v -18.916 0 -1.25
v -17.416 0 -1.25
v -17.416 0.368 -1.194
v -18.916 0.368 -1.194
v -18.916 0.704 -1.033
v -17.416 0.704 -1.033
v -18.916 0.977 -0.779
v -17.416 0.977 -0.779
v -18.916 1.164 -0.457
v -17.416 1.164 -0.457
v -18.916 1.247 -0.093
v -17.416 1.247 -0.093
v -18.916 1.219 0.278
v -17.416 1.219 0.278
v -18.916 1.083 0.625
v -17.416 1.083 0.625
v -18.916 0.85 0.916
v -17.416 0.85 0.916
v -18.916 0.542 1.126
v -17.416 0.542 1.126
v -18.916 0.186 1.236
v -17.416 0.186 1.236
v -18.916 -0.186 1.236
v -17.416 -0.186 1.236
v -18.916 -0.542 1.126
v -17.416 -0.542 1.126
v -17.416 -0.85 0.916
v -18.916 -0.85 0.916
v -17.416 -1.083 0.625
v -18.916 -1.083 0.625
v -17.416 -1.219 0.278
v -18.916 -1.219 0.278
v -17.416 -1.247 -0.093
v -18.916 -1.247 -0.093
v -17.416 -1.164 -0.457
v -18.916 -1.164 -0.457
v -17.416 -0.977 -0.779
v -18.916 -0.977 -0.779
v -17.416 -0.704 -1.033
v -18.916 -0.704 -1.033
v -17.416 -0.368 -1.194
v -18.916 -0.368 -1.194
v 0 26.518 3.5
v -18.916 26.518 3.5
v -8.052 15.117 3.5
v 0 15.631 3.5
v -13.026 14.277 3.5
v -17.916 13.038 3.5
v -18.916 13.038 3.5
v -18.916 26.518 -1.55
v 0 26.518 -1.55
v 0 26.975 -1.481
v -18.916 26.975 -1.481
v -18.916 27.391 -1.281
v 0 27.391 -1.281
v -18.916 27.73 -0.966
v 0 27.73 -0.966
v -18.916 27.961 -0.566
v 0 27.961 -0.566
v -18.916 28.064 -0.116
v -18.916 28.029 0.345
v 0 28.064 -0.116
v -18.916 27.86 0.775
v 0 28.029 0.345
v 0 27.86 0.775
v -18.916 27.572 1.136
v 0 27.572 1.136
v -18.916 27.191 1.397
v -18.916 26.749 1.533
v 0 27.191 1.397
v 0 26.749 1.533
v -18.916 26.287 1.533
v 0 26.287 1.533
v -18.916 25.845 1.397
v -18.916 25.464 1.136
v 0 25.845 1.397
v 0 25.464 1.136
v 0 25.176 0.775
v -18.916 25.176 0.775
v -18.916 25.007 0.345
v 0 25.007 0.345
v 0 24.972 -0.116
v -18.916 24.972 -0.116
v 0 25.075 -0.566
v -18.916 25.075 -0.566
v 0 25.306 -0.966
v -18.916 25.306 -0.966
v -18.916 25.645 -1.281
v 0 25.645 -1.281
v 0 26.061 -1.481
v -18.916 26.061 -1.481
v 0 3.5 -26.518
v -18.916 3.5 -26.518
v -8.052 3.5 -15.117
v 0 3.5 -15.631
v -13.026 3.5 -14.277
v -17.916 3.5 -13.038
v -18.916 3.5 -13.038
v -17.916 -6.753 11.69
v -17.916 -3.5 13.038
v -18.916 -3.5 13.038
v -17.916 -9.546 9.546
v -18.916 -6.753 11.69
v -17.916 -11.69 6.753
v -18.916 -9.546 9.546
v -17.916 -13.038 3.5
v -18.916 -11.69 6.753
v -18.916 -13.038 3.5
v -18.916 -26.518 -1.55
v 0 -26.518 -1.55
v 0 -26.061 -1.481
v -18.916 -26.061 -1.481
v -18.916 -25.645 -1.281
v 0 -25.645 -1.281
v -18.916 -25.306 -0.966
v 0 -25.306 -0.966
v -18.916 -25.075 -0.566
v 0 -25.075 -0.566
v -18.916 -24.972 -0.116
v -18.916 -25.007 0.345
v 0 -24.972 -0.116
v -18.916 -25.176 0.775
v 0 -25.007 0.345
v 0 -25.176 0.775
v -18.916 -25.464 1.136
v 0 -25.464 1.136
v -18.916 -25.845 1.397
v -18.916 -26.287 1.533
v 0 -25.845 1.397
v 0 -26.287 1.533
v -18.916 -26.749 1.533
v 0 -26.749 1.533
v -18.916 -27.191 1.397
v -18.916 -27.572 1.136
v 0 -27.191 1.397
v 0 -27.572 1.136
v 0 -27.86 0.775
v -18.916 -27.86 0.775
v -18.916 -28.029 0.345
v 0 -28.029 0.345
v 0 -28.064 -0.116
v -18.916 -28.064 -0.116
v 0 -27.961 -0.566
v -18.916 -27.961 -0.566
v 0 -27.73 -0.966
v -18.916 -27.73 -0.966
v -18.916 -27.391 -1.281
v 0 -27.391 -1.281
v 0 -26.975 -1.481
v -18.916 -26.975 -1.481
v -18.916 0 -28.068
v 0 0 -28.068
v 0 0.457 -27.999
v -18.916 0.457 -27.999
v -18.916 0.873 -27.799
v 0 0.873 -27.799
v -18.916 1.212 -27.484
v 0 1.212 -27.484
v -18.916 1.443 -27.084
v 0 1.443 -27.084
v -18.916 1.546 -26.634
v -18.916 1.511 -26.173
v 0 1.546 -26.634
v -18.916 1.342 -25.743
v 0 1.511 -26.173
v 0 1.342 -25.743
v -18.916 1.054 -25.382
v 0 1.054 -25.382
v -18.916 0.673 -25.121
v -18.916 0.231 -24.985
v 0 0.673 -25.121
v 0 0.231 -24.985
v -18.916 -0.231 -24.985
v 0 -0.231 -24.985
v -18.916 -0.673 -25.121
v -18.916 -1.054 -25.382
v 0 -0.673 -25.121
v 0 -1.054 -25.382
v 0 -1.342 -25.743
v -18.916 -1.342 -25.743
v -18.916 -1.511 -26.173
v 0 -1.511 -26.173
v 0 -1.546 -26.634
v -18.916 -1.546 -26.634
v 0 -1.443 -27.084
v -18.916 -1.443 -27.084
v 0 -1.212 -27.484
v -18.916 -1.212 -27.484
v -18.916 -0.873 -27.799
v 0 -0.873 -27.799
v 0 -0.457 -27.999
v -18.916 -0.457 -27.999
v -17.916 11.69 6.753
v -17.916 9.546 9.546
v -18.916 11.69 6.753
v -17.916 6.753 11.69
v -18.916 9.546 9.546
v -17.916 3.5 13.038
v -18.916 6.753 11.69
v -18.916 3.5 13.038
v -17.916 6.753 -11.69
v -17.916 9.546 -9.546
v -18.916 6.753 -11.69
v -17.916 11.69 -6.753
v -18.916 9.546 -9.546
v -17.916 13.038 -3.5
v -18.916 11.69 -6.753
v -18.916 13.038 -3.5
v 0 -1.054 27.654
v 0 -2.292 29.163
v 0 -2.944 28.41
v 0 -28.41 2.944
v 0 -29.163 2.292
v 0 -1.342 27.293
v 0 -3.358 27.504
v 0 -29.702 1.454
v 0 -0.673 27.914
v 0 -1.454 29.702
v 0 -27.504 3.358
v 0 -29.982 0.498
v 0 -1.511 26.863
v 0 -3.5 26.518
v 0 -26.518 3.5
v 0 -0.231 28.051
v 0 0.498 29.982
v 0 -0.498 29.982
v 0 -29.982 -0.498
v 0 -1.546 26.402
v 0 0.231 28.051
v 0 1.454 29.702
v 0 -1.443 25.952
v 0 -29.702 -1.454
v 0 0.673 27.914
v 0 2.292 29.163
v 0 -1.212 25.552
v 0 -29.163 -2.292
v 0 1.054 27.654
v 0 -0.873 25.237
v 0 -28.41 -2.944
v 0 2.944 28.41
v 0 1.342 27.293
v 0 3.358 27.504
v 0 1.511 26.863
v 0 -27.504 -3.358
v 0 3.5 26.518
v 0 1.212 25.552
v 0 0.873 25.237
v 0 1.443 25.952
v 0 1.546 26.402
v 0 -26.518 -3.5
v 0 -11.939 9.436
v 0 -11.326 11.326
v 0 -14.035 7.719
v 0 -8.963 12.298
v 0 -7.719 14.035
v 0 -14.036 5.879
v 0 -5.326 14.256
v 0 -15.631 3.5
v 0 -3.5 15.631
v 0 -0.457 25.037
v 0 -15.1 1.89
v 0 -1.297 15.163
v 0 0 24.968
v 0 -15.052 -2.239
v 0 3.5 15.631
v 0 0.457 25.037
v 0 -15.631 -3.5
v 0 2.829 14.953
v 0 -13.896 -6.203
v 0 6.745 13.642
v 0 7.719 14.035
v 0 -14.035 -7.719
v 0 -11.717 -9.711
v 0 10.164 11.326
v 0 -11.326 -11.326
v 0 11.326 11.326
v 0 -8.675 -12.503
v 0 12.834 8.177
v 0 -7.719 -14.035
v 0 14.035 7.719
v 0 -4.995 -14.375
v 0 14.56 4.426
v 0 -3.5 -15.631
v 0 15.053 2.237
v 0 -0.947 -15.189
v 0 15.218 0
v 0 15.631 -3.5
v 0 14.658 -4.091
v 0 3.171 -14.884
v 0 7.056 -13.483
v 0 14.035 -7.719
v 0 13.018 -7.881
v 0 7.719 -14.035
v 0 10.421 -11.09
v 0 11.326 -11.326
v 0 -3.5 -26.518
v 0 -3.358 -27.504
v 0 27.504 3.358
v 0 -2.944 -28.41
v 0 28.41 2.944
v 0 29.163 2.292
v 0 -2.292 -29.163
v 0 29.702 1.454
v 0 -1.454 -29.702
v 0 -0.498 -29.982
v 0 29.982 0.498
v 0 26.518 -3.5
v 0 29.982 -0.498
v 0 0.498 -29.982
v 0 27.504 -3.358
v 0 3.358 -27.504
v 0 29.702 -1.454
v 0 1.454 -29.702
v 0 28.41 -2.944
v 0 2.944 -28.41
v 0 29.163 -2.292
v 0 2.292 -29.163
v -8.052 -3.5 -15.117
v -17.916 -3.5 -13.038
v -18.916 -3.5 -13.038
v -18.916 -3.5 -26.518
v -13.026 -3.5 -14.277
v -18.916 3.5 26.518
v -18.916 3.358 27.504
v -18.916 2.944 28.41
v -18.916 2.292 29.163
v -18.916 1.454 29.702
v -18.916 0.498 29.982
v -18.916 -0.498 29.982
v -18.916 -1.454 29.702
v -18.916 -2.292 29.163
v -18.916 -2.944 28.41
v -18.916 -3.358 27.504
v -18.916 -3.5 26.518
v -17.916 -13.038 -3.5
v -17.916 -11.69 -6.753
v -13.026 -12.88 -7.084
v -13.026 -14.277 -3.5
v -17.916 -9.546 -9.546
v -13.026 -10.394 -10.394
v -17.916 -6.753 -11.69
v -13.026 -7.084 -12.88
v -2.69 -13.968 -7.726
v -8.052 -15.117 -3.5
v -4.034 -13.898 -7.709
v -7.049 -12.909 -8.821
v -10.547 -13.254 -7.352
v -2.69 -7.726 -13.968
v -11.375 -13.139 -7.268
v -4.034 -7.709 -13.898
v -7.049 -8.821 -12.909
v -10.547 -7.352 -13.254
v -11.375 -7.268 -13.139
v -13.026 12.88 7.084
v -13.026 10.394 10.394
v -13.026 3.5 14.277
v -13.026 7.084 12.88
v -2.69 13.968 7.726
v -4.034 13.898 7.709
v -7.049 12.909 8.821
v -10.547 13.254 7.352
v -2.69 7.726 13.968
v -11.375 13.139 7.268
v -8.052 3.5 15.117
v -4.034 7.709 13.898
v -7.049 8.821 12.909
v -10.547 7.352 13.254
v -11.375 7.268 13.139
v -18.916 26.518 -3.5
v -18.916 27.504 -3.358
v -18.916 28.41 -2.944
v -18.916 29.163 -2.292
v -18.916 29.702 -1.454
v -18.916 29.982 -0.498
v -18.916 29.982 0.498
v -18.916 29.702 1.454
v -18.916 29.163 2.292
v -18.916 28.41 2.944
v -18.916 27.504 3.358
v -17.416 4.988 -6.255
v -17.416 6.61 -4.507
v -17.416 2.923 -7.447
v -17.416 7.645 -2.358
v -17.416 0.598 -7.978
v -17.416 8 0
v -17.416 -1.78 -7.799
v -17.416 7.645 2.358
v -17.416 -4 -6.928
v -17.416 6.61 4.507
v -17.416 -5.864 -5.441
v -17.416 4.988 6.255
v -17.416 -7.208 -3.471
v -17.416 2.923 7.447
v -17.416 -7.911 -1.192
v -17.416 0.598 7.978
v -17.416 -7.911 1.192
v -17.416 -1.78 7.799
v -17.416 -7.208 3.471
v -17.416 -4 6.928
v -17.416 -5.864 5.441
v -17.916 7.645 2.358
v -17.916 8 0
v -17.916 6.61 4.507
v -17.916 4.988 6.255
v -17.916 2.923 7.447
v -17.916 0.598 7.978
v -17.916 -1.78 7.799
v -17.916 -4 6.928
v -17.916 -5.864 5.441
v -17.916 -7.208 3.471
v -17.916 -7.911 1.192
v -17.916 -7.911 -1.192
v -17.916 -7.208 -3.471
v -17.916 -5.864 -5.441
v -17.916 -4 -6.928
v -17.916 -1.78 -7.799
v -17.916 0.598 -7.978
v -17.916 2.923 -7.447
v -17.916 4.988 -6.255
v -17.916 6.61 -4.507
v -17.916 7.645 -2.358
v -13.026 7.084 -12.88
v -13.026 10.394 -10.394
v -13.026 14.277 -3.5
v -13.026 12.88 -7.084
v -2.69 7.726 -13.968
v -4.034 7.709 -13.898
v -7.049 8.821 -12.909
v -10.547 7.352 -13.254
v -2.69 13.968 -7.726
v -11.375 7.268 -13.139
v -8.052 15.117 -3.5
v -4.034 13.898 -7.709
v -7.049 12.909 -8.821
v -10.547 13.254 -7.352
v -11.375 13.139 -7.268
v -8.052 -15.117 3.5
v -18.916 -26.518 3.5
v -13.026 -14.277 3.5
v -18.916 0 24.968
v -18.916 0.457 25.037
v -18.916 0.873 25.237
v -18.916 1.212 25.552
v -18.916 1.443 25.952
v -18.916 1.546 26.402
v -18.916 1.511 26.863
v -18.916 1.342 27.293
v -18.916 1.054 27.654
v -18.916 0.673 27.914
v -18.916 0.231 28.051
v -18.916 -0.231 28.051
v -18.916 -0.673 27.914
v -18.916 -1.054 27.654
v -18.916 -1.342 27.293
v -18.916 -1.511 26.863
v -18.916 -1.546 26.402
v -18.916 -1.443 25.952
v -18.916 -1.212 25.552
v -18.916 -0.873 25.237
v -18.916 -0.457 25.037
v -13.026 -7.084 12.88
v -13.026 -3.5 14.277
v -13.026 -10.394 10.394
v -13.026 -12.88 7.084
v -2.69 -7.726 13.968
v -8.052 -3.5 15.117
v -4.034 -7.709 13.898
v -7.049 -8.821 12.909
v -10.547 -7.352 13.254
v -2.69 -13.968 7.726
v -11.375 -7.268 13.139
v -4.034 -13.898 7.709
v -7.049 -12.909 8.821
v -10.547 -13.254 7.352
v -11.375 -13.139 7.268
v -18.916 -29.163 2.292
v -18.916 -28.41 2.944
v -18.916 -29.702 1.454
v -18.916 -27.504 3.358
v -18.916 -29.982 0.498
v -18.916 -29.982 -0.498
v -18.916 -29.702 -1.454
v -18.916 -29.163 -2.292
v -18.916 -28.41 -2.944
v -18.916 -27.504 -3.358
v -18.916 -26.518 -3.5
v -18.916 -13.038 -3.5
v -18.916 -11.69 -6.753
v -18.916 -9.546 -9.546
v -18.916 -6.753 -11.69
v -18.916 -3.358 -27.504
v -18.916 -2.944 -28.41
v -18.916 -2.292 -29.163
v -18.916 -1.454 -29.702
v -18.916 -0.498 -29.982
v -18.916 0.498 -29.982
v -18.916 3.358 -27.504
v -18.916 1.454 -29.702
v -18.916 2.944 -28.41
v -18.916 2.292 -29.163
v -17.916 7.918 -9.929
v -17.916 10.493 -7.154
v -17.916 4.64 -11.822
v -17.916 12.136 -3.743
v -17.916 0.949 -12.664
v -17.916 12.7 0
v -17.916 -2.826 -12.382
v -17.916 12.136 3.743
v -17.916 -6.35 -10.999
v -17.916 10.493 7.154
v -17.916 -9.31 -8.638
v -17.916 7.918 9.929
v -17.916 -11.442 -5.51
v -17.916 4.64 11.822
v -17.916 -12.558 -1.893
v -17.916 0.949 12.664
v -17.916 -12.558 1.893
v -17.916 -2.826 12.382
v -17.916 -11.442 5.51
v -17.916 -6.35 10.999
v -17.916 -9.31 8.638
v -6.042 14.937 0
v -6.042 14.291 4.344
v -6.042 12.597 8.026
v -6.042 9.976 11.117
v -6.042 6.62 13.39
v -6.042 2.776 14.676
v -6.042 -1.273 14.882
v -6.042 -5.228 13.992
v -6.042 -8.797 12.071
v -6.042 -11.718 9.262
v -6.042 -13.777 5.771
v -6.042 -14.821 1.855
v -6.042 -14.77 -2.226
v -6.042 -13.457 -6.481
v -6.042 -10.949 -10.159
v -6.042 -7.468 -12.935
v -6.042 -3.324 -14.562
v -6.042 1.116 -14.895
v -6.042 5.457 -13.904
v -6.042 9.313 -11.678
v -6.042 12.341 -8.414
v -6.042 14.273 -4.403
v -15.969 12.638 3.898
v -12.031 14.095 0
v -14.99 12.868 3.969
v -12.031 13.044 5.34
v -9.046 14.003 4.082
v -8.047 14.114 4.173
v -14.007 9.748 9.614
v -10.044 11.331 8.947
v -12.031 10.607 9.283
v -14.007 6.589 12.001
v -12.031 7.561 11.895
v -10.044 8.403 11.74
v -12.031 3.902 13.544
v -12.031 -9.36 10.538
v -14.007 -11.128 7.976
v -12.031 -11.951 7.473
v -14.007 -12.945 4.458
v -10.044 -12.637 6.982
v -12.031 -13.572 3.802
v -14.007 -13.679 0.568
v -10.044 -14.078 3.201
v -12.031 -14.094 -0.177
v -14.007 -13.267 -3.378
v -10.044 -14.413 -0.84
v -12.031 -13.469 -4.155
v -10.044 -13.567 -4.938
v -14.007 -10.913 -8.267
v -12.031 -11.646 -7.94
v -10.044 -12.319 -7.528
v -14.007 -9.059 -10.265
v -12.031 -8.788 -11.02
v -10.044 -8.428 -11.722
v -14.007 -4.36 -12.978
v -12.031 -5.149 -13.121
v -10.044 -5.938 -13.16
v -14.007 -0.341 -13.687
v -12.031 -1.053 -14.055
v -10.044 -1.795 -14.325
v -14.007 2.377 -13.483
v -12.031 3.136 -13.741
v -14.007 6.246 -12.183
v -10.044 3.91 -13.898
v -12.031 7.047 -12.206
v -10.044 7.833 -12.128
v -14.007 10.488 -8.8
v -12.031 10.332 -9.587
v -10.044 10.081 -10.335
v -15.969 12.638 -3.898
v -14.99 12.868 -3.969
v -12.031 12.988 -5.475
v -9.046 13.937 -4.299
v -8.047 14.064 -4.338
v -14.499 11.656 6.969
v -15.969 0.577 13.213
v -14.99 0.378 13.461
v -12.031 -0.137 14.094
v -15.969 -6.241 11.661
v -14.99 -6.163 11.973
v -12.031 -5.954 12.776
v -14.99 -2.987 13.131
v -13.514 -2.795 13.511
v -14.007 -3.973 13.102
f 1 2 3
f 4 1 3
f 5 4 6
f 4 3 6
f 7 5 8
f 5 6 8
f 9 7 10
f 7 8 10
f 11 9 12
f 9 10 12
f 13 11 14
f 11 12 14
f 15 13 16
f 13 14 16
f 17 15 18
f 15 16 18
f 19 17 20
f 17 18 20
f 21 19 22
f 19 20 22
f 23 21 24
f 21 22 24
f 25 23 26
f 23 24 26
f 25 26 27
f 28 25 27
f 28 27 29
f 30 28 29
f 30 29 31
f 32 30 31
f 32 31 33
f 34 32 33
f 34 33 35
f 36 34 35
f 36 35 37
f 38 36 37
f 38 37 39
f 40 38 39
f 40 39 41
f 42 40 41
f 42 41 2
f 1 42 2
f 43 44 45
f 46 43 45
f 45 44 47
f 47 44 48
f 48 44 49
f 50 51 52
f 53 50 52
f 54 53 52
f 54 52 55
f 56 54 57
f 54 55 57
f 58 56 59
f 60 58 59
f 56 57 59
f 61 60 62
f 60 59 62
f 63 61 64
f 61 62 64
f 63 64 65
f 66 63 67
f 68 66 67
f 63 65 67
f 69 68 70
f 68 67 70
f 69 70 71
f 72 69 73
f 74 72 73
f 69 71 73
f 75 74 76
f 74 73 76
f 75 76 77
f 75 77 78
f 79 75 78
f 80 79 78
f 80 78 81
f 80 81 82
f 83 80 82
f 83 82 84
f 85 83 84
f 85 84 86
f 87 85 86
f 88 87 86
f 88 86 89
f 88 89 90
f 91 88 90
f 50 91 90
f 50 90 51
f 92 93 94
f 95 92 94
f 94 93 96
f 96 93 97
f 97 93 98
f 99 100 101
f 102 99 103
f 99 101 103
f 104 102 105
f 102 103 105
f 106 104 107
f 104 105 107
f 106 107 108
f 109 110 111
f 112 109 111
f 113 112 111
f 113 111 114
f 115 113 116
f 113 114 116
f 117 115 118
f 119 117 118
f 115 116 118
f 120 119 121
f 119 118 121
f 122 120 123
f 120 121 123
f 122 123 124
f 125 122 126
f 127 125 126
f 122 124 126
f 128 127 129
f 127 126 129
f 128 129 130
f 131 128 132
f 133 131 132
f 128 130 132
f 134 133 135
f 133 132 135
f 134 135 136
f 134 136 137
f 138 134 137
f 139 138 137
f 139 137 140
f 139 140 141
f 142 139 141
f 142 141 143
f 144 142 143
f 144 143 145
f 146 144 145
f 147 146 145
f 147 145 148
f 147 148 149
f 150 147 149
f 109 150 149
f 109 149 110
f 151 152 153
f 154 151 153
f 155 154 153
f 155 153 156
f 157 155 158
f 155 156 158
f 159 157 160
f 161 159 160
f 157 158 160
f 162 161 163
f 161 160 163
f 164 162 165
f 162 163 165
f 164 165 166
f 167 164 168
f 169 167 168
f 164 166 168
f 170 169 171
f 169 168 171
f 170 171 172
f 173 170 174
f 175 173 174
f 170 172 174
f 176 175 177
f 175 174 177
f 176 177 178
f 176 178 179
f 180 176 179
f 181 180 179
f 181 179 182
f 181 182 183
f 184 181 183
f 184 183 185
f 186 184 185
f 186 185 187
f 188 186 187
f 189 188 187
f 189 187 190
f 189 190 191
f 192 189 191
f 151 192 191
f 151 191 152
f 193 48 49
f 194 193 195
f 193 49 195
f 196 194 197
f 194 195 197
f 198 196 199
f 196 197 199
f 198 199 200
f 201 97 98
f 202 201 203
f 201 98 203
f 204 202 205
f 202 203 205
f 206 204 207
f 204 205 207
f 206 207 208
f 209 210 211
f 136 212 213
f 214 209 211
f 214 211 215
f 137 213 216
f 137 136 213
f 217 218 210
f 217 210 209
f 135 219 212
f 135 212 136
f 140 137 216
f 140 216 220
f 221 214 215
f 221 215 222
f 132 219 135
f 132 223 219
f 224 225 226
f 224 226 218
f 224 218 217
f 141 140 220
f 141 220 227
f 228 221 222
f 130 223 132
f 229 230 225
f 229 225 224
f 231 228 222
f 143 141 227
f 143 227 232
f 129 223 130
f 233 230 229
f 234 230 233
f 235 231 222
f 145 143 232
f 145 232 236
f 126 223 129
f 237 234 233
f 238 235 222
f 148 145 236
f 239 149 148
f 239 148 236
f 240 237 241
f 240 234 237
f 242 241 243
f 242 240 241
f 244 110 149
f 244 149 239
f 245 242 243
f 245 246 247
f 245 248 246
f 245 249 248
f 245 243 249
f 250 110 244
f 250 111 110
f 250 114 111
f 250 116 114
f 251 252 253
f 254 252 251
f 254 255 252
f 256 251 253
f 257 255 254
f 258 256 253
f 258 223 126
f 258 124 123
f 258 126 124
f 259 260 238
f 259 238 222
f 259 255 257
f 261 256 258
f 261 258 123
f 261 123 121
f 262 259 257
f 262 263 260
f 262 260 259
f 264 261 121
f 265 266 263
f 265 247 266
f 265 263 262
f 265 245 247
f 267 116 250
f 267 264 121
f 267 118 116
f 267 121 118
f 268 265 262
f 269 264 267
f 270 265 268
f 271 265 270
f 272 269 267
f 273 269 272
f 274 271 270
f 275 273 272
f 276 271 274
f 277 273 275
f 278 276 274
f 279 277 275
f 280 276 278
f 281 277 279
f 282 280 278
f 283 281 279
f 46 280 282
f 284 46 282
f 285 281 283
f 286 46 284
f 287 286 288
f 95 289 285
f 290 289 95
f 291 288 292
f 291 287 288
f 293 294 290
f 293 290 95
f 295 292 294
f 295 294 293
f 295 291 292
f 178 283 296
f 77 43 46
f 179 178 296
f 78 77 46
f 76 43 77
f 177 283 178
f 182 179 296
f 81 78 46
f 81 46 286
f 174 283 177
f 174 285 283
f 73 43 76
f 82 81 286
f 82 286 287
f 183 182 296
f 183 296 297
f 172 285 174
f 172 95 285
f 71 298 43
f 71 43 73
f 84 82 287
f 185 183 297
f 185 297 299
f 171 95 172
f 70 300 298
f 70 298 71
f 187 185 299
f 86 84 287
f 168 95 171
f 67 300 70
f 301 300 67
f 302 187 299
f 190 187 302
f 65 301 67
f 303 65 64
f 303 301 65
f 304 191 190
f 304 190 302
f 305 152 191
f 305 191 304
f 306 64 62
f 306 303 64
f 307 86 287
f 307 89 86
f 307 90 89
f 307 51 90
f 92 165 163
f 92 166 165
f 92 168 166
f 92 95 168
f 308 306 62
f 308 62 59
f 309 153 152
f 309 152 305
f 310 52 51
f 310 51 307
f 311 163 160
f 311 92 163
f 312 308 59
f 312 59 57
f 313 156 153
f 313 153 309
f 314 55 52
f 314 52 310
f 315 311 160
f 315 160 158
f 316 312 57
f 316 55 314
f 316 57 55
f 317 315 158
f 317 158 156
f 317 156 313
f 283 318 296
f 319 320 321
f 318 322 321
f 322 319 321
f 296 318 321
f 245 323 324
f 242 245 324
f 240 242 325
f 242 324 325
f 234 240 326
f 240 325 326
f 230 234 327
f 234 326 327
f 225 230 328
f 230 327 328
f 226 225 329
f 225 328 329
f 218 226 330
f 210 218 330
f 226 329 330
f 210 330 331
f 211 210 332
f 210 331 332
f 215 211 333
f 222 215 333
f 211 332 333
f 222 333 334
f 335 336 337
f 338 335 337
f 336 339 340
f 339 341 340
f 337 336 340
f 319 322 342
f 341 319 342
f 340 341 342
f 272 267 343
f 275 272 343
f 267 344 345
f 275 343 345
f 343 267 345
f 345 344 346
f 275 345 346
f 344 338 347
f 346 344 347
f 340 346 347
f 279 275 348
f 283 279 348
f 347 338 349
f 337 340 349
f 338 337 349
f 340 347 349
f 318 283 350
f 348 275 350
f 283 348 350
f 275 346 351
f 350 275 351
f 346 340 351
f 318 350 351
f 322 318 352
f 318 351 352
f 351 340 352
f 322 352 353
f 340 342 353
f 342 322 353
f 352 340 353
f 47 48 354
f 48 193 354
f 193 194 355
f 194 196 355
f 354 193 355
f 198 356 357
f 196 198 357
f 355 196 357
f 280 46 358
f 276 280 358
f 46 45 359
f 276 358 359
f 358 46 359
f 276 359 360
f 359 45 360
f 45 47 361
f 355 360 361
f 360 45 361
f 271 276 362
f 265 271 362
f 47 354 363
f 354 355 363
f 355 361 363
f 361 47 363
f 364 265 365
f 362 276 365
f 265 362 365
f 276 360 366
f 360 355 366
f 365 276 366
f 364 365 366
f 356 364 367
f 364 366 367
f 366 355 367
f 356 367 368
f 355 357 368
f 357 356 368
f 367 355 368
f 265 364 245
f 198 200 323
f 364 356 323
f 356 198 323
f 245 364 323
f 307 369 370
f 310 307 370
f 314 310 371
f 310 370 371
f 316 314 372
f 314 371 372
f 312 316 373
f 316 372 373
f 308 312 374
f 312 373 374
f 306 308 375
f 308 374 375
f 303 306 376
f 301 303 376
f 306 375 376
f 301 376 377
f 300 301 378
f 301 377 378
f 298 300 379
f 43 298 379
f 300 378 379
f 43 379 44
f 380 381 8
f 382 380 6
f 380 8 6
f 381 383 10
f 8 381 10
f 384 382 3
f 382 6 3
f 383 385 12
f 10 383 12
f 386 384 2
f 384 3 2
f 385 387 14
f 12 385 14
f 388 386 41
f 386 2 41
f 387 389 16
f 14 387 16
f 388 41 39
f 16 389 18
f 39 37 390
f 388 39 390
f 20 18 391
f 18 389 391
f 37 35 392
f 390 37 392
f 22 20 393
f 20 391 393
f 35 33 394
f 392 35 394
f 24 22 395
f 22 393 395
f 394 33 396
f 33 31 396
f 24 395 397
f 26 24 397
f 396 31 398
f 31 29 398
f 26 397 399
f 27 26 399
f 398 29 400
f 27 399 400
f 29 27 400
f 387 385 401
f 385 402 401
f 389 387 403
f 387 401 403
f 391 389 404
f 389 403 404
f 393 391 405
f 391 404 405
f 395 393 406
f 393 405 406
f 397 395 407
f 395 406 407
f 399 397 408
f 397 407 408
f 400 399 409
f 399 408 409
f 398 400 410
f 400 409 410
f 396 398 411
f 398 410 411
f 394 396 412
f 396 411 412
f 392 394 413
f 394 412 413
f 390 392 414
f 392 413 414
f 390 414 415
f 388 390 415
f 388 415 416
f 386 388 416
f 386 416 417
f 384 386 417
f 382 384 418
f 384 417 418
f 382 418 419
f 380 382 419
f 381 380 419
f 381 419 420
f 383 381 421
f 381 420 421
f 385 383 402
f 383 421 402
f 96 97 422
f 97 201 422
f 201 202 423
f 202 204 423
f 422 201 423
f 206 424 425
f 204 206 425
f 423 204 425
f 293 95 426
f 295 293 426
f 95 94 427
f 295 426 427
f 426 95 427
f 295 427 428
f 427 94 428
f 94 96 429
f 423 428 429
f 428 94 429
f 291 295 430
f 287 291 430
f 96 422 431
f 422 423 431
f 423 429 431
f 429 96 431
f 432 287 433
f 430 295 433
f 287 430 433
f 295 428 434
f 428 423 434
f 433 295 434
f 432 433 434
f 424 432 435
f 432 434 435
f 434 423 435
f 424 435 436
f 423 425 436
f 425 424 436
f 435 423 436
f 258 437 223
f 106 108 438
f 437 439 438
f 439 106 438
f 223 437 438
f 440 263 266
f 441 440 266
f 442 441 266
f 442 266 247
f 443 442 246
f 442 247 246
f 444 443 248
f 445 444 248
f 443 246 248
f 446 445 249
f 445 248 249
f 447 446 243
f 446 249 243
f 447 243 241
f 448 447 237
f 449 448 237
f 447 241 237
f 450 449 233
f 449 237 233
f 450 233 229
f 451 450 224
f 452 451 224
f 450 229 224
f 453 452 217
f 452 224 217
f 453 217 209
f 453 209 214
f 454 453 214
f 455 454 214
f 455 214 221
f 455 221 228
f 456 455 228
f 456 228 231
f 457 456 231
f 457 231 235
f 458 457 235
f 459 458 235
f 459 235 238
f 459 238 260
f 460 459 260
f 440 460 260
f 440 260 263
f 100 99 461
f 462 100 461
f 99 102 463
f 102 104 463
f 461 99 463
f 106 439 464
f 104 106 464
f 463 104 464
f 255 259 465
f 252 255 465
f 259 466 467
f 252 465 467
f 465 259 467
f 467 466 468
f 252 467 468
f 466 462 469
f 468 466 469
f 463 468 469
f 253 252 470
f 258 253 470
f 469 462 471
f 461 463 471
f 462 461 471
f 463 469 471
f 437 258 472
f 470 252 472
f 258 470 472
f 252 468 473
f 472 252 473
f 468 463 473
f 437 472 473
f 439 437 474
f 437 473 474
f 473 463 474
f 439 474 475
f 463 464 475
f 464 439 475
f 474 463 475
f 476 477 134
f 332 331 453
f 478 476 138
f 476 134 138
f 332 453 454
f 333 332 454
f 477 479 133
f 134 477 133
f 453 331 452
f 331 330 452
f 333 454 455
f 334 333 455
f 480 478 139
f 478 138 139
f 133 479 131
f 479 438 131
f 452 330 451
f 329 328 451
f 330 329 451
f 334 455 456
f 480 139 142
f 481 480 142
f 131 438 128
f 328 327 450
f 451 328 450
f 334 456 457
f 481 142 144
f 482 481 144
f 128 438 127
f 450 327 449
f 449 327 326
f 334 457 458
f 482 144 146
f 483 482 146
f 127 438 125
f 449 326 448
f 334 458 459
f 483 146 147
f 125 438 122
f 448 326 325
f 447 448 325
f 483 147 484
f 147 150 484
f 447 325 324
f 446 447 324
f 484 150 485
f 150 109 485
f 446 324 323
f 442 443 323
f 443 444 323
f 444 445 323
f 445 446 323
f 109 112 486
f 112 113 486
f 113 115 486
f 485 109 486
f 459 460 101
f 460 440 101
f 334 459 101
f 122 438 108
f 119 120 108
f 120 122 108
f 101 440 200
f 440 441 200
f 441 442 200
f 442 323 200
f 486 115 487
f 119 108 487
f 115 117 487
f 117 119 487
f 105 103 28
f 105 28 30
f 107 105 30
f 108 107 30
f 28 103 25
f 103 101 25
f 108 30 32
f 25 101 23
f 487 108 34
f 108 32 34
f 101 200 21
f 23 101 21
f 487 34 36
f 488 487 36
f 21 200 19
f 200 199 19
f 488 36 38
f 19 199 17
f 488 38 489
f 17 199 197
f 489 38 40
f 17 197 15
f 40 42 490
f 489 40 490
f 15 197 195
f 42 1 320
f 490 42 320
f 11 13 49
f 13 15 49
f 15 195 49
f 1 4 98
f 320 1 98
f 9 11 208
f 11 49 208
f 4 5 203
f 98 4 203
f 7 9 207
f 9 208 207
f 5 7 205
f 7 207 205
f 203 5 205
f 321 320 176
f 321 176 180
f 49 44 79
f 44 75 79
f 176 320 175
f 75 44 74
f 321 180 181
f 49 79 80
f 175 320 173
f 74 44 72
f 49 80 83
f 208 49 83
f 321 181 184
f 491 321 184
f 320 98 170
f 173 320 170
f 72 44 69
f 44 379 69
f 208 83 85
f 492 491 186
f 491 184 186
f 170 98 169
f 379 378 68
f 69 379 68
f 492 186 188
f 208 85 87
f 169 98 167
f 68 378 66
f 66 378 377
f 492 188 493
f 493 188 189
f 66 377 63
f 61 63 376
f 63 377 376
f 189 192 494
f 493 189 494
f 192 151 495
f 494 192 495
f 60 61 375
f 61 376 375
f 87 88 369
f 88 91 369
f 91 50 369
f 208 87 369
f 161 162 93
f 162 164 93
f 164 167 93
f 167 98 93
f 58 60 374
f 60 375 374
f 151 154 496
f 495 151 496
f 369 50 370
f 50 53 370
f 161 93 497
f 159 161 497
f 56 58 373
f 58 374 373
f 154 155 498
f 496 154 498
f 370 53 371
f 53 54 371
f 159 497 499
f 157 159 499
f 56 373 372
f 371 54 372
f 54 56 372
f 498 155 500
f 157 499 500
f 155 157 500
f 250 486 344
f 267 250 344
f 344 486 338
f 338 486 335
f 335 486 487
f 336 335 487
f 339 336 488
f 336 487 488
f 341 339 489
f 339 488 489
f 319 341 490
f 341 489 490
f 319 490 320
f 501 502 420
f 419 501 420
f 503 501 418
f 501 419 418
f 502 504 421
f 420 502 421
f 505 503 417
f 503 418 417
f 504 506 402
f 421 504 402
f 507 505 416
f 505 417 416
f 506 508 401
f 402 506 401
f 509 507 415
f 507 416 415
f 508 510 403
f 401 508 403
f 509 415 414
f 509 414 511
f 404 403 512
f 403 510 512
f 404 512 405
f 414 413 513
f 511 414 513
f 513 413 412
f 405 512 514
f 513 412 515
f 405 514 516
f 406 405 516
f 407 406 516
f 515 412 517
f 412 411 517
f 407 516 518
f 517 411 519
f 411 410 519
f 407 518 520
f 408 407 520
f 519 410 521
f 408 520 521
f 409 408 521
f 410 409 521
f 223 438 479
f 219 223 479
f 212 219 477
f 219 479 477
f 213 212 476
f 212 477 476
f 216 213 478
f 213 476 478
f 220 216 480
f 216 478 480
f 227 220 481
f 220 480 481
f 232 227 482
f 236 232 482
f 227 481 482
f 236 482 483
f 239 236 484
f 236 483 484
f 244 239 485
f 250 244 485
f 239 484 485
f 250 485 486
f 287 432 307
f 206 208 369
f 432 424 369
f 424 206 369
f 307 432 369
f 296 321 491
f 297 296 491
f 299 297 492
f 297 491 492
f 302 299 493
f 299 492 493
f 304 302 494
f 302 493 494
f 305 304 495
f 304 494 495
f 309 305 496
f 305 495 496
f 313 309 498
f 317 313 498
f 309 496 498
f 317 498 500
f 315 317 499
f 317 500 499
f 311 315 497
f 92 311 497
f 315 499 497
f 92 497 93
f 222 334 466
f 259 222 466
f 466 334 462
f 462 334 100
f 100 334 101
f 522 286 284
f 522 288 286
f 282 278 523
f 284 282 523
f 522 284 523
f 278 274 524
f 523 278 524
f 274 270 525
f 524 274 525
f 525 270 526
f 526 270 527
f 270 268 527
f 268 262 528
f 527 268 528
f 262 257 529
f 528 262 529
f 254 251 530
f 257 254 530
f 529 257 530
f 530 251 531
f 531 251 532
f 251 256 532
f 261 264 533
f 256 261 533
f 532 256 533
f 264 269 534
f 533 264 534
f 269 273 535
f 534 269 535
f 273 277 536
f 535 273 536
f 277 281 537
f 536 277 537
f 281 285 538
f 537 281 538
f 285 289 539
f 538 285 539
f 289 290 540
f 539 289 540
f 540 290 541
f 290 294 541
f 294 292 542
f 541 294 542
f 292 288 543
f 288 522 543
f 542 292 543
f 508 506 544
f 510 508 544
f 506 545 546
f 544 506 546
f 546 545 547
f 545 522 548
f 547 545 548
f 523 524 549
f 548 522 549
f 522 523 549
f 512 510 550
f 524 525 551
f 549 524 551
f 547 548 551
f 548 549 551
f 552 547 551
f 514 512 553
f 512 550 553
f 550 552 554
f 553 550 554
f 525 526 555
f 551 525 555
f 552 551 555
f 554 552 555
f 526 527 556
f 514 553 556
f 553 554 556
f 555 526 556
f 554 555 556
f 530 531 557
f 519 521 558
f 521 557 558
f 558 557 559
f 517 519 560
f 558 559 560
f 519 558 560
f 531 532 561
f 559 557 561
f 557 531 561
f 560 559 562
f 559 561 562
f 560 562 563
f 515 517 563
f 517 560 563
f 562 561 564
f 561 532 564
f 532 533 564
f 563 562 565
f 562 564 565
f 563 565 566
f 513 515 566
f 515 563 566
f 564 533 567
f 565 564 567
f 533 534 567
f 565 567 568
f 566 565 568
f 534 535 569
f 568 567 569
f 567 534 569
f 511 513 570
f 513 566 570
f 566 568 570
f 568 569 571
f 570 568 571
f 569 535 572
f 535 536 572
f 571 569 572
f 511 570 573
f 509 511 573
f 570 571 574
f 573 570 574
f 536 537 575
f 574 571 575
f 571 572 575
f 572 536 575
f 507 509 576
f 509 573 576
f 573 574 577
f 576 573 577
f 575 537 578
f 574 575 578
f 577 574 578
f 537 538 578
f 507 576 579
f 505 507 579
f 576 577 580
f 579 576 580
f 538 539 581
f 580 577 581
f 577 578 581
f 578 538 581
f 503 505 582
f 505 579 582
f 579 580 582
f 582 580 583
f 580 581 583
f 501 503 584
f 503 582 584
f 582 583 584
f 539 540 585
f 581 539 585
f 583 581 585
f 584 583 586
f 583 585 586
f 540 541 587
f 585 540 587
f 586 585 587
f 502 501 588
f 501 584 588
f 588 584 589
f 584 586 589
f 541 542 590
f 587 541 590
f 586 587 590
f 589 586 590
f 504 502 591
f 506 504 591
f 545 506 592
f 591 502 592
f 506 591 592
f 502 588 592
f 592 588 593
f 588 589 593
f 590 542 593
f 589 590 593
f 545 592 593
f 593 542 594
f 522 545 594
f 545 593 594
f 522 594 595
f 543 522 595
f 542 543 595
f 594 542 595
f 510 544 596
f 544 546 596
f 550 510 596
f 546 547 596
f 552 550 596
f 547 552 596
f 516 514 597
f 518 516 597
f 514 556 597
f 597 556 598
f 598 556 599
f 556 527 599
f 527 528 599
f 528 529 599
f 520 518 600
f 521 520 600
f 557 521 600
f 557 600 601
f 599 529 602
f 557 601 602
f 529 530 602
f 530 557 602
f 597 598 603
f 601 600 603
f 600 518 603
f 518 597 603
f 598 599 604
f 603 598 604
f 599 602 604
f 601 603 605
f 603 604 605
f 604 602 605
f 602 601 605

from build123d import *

# Parameters (mm, degrees)
BOSS_EXTRUDE1_DEPTH = 18.916428128
SKETCH2_R           = 1.25
CUT_EXTRUDE1_DEPTH  = 47.475699972
SKETCH4_R           = 1.55
CUT_EXTRUDE2_DEPTH  = 47.475699972


# Read off the part's stored shape, not the designer's step: Roller coating 12, Roller core 12 coated
with BuildPart() as part:
    # Roller coating 12 outline → Roller coating 12 (revolve)
    with BuildSketch(Plane.YX):
        with BuildLine():
            ThreePointArc((12.7, -17.916428128), (15.217989764, 0), (12.7, 17.916428128))
            Line((12.7, 17.916428128), (8, 17.916428128))
            Line((8, 17.916428128), (8, 17.416428128))
            Line((8, 17.416428128), (12.322080058, 17.416428128))
            ThreePointArc((12.322080058, 17.416428128), (14.717989764, 0), (12.322080058, -17.416428128))
            Line((12.322080058, -17.416428128), (8, -17.416428128))
            Line((8, -17.416428128), (8, -17.916428128))
            Line((8, -17.916428128), (12.7, -17.916428128))
        make_face()
    revolve(axis=Axis((0, 0, 0), (1, 0, 0)))


with BuildPart() as body_2:
    # Roller core 12 coated outline → Roller core 12 coated (revolve)
    with BuildSketch(Plane.YX):
        with BuildLine():
            Line((1.25, 17.416428128), (1.25, -17.416428128))
            Line((1.25, -17.416428128), (12.322080058, -17.416428128))
            ThreePointArc((12.322080058, -17.416428128), (14.717989764, 0), (12.322080058, 17.416428128))
            Line((12.322080058, 17.416428128), (1.25, 17.416428128))
        make_face()
    revolve(axis=Axis((0, 0, 0), (1, 0, 0)))


with BuildPart() as part_1:
    add(part.part)

    # Combine1: union body 2
    add(body_2.part)


with BuildPart() as body_2_2:
    # Sketch1 → Revolve1 (revolve)
    with BuildSketch(Plane.XY, mode=Mode.PRIVATE) as revolve1_sk:
        with BuildLine():
            Line((0, 0), (0, 15.217989764))
            Line((0, 15.217989764), (0, 16.017989764))
            ThreePointArc((0, 16.017989764), (-9.046251562, 15.385414232), (-17.916428128, 13.5))
            Line((-17.916428128, 13.5), (-18.916428128, 13.5))
            Line((-18.916428128, 13.5), (-18.916428128, 0))
            Line((-18.916428128, 0), (0, 0))
        make_face()
    revolve(revolve1_sk.sketch.rotate(Axis((-18.916428128, 0, 0), (1, 0, 0)), 270), axis=Axis((-18.916428128, 0, 0), (1, 0, 0)))

    # Sketch3 → Boss-Extrude1 (add)
    with BuildSketch(Plane(origin=(-18.916428128, 0, 0), x_dir=(0, 0, -1), z_dir=(1, 0, 0))):
        with BuildLine():
            Line((-3.5, 26.517989764), (-3.5, 13.03840481))
            ThreePointArc((-3.5, 13.03840481), (-9.545941546, 9.545941546), (-13.03840481, 3.5))
            Line((-13.03840481, 3.5), (-26.517989764, 3.5))
            ThreePointArc((-26.517989764, 3.5), (-30.017989764, 0), (-26.517989764, -3.5))
            Line((-26.517989764, -3.5), (-13.03840481, -3.5))
            ThreePointArc((-13.03840481, -3.5), (-9.545941546, -9.545941546), (-3.5, -13.03840481))
            Line((-3.5, -13.03840481), (-3.5, -26.517989764))
            ThreePointArc((-3.5, -26.517989764), (0, -30.017989764), (3.5, -26.517989764))
            Line((3.5, -26.517989764), (3.5, -13.03840481))
            ThreePointArc((3.5, -13.03840481), (9.545941546, -9.545941546), (13.03840481, -3.5))
            Line((13.03840481, -3.5), (26.517989764, -3.5))
            ThreePointArc((26.517989764, -3.5), (30.017989764, 0), (26.517989764, 3.5))
            Line((26.517989764, 3.5), (13.03840481, 3.5))
            ThreePointArc((13.03840481, 3.5), (9.545941546, 9.545941546), (3.5, 13.03840481))
            Line((3.5, 13.03840481), (3.5, 26.517989764))
            ThreePointArc((3.5, 26.517989764), (0, 30.017989764), (-3.5, 26.517989764))
        make_face()
    extrude(amount=BOSS_EXTRUDE1_DEPTH)

    # Combine2: cut part
    add(part_1.part, mode=Mode.SUBTRACT)

    # Sketch2 → Cut-Extrude1 (cut, through all)
    with BuildSketch(Plane(origin=(0, 0, 0), x_dir=(0, 0, -1), z_dir=(1, 0, 0))):
        Circle(SKETCH2_R)
    extrude(amount=-CUT_EXTRUDE1_DEPTH, mode=Mode.SUBTRACT)

    # Sketch4 → Cut-Extrude2 (cut, through all)
    with BuildSketch(Plane(origin=(0, 0, 0), x_dir=(0, 0, -1), z_dir=(1, 0, 0))):
        with Locations((0, -26.517989764)):
            Circle(SKETCH4_R)
        with Locations((-26.517989764, 0)):
            Circle(SKETCH4_R)
        with Locations((0, 26.517989764)):
            Circle(SKETCH4_R)
        with Locations((26.517989764, 0)):
            Circle(SKETCH4_R)
    extrude(amount=-CUT_EXTRUDE2_DEPTH, mode=Mode.SUBTRACT)


solid = body_2_2.part
